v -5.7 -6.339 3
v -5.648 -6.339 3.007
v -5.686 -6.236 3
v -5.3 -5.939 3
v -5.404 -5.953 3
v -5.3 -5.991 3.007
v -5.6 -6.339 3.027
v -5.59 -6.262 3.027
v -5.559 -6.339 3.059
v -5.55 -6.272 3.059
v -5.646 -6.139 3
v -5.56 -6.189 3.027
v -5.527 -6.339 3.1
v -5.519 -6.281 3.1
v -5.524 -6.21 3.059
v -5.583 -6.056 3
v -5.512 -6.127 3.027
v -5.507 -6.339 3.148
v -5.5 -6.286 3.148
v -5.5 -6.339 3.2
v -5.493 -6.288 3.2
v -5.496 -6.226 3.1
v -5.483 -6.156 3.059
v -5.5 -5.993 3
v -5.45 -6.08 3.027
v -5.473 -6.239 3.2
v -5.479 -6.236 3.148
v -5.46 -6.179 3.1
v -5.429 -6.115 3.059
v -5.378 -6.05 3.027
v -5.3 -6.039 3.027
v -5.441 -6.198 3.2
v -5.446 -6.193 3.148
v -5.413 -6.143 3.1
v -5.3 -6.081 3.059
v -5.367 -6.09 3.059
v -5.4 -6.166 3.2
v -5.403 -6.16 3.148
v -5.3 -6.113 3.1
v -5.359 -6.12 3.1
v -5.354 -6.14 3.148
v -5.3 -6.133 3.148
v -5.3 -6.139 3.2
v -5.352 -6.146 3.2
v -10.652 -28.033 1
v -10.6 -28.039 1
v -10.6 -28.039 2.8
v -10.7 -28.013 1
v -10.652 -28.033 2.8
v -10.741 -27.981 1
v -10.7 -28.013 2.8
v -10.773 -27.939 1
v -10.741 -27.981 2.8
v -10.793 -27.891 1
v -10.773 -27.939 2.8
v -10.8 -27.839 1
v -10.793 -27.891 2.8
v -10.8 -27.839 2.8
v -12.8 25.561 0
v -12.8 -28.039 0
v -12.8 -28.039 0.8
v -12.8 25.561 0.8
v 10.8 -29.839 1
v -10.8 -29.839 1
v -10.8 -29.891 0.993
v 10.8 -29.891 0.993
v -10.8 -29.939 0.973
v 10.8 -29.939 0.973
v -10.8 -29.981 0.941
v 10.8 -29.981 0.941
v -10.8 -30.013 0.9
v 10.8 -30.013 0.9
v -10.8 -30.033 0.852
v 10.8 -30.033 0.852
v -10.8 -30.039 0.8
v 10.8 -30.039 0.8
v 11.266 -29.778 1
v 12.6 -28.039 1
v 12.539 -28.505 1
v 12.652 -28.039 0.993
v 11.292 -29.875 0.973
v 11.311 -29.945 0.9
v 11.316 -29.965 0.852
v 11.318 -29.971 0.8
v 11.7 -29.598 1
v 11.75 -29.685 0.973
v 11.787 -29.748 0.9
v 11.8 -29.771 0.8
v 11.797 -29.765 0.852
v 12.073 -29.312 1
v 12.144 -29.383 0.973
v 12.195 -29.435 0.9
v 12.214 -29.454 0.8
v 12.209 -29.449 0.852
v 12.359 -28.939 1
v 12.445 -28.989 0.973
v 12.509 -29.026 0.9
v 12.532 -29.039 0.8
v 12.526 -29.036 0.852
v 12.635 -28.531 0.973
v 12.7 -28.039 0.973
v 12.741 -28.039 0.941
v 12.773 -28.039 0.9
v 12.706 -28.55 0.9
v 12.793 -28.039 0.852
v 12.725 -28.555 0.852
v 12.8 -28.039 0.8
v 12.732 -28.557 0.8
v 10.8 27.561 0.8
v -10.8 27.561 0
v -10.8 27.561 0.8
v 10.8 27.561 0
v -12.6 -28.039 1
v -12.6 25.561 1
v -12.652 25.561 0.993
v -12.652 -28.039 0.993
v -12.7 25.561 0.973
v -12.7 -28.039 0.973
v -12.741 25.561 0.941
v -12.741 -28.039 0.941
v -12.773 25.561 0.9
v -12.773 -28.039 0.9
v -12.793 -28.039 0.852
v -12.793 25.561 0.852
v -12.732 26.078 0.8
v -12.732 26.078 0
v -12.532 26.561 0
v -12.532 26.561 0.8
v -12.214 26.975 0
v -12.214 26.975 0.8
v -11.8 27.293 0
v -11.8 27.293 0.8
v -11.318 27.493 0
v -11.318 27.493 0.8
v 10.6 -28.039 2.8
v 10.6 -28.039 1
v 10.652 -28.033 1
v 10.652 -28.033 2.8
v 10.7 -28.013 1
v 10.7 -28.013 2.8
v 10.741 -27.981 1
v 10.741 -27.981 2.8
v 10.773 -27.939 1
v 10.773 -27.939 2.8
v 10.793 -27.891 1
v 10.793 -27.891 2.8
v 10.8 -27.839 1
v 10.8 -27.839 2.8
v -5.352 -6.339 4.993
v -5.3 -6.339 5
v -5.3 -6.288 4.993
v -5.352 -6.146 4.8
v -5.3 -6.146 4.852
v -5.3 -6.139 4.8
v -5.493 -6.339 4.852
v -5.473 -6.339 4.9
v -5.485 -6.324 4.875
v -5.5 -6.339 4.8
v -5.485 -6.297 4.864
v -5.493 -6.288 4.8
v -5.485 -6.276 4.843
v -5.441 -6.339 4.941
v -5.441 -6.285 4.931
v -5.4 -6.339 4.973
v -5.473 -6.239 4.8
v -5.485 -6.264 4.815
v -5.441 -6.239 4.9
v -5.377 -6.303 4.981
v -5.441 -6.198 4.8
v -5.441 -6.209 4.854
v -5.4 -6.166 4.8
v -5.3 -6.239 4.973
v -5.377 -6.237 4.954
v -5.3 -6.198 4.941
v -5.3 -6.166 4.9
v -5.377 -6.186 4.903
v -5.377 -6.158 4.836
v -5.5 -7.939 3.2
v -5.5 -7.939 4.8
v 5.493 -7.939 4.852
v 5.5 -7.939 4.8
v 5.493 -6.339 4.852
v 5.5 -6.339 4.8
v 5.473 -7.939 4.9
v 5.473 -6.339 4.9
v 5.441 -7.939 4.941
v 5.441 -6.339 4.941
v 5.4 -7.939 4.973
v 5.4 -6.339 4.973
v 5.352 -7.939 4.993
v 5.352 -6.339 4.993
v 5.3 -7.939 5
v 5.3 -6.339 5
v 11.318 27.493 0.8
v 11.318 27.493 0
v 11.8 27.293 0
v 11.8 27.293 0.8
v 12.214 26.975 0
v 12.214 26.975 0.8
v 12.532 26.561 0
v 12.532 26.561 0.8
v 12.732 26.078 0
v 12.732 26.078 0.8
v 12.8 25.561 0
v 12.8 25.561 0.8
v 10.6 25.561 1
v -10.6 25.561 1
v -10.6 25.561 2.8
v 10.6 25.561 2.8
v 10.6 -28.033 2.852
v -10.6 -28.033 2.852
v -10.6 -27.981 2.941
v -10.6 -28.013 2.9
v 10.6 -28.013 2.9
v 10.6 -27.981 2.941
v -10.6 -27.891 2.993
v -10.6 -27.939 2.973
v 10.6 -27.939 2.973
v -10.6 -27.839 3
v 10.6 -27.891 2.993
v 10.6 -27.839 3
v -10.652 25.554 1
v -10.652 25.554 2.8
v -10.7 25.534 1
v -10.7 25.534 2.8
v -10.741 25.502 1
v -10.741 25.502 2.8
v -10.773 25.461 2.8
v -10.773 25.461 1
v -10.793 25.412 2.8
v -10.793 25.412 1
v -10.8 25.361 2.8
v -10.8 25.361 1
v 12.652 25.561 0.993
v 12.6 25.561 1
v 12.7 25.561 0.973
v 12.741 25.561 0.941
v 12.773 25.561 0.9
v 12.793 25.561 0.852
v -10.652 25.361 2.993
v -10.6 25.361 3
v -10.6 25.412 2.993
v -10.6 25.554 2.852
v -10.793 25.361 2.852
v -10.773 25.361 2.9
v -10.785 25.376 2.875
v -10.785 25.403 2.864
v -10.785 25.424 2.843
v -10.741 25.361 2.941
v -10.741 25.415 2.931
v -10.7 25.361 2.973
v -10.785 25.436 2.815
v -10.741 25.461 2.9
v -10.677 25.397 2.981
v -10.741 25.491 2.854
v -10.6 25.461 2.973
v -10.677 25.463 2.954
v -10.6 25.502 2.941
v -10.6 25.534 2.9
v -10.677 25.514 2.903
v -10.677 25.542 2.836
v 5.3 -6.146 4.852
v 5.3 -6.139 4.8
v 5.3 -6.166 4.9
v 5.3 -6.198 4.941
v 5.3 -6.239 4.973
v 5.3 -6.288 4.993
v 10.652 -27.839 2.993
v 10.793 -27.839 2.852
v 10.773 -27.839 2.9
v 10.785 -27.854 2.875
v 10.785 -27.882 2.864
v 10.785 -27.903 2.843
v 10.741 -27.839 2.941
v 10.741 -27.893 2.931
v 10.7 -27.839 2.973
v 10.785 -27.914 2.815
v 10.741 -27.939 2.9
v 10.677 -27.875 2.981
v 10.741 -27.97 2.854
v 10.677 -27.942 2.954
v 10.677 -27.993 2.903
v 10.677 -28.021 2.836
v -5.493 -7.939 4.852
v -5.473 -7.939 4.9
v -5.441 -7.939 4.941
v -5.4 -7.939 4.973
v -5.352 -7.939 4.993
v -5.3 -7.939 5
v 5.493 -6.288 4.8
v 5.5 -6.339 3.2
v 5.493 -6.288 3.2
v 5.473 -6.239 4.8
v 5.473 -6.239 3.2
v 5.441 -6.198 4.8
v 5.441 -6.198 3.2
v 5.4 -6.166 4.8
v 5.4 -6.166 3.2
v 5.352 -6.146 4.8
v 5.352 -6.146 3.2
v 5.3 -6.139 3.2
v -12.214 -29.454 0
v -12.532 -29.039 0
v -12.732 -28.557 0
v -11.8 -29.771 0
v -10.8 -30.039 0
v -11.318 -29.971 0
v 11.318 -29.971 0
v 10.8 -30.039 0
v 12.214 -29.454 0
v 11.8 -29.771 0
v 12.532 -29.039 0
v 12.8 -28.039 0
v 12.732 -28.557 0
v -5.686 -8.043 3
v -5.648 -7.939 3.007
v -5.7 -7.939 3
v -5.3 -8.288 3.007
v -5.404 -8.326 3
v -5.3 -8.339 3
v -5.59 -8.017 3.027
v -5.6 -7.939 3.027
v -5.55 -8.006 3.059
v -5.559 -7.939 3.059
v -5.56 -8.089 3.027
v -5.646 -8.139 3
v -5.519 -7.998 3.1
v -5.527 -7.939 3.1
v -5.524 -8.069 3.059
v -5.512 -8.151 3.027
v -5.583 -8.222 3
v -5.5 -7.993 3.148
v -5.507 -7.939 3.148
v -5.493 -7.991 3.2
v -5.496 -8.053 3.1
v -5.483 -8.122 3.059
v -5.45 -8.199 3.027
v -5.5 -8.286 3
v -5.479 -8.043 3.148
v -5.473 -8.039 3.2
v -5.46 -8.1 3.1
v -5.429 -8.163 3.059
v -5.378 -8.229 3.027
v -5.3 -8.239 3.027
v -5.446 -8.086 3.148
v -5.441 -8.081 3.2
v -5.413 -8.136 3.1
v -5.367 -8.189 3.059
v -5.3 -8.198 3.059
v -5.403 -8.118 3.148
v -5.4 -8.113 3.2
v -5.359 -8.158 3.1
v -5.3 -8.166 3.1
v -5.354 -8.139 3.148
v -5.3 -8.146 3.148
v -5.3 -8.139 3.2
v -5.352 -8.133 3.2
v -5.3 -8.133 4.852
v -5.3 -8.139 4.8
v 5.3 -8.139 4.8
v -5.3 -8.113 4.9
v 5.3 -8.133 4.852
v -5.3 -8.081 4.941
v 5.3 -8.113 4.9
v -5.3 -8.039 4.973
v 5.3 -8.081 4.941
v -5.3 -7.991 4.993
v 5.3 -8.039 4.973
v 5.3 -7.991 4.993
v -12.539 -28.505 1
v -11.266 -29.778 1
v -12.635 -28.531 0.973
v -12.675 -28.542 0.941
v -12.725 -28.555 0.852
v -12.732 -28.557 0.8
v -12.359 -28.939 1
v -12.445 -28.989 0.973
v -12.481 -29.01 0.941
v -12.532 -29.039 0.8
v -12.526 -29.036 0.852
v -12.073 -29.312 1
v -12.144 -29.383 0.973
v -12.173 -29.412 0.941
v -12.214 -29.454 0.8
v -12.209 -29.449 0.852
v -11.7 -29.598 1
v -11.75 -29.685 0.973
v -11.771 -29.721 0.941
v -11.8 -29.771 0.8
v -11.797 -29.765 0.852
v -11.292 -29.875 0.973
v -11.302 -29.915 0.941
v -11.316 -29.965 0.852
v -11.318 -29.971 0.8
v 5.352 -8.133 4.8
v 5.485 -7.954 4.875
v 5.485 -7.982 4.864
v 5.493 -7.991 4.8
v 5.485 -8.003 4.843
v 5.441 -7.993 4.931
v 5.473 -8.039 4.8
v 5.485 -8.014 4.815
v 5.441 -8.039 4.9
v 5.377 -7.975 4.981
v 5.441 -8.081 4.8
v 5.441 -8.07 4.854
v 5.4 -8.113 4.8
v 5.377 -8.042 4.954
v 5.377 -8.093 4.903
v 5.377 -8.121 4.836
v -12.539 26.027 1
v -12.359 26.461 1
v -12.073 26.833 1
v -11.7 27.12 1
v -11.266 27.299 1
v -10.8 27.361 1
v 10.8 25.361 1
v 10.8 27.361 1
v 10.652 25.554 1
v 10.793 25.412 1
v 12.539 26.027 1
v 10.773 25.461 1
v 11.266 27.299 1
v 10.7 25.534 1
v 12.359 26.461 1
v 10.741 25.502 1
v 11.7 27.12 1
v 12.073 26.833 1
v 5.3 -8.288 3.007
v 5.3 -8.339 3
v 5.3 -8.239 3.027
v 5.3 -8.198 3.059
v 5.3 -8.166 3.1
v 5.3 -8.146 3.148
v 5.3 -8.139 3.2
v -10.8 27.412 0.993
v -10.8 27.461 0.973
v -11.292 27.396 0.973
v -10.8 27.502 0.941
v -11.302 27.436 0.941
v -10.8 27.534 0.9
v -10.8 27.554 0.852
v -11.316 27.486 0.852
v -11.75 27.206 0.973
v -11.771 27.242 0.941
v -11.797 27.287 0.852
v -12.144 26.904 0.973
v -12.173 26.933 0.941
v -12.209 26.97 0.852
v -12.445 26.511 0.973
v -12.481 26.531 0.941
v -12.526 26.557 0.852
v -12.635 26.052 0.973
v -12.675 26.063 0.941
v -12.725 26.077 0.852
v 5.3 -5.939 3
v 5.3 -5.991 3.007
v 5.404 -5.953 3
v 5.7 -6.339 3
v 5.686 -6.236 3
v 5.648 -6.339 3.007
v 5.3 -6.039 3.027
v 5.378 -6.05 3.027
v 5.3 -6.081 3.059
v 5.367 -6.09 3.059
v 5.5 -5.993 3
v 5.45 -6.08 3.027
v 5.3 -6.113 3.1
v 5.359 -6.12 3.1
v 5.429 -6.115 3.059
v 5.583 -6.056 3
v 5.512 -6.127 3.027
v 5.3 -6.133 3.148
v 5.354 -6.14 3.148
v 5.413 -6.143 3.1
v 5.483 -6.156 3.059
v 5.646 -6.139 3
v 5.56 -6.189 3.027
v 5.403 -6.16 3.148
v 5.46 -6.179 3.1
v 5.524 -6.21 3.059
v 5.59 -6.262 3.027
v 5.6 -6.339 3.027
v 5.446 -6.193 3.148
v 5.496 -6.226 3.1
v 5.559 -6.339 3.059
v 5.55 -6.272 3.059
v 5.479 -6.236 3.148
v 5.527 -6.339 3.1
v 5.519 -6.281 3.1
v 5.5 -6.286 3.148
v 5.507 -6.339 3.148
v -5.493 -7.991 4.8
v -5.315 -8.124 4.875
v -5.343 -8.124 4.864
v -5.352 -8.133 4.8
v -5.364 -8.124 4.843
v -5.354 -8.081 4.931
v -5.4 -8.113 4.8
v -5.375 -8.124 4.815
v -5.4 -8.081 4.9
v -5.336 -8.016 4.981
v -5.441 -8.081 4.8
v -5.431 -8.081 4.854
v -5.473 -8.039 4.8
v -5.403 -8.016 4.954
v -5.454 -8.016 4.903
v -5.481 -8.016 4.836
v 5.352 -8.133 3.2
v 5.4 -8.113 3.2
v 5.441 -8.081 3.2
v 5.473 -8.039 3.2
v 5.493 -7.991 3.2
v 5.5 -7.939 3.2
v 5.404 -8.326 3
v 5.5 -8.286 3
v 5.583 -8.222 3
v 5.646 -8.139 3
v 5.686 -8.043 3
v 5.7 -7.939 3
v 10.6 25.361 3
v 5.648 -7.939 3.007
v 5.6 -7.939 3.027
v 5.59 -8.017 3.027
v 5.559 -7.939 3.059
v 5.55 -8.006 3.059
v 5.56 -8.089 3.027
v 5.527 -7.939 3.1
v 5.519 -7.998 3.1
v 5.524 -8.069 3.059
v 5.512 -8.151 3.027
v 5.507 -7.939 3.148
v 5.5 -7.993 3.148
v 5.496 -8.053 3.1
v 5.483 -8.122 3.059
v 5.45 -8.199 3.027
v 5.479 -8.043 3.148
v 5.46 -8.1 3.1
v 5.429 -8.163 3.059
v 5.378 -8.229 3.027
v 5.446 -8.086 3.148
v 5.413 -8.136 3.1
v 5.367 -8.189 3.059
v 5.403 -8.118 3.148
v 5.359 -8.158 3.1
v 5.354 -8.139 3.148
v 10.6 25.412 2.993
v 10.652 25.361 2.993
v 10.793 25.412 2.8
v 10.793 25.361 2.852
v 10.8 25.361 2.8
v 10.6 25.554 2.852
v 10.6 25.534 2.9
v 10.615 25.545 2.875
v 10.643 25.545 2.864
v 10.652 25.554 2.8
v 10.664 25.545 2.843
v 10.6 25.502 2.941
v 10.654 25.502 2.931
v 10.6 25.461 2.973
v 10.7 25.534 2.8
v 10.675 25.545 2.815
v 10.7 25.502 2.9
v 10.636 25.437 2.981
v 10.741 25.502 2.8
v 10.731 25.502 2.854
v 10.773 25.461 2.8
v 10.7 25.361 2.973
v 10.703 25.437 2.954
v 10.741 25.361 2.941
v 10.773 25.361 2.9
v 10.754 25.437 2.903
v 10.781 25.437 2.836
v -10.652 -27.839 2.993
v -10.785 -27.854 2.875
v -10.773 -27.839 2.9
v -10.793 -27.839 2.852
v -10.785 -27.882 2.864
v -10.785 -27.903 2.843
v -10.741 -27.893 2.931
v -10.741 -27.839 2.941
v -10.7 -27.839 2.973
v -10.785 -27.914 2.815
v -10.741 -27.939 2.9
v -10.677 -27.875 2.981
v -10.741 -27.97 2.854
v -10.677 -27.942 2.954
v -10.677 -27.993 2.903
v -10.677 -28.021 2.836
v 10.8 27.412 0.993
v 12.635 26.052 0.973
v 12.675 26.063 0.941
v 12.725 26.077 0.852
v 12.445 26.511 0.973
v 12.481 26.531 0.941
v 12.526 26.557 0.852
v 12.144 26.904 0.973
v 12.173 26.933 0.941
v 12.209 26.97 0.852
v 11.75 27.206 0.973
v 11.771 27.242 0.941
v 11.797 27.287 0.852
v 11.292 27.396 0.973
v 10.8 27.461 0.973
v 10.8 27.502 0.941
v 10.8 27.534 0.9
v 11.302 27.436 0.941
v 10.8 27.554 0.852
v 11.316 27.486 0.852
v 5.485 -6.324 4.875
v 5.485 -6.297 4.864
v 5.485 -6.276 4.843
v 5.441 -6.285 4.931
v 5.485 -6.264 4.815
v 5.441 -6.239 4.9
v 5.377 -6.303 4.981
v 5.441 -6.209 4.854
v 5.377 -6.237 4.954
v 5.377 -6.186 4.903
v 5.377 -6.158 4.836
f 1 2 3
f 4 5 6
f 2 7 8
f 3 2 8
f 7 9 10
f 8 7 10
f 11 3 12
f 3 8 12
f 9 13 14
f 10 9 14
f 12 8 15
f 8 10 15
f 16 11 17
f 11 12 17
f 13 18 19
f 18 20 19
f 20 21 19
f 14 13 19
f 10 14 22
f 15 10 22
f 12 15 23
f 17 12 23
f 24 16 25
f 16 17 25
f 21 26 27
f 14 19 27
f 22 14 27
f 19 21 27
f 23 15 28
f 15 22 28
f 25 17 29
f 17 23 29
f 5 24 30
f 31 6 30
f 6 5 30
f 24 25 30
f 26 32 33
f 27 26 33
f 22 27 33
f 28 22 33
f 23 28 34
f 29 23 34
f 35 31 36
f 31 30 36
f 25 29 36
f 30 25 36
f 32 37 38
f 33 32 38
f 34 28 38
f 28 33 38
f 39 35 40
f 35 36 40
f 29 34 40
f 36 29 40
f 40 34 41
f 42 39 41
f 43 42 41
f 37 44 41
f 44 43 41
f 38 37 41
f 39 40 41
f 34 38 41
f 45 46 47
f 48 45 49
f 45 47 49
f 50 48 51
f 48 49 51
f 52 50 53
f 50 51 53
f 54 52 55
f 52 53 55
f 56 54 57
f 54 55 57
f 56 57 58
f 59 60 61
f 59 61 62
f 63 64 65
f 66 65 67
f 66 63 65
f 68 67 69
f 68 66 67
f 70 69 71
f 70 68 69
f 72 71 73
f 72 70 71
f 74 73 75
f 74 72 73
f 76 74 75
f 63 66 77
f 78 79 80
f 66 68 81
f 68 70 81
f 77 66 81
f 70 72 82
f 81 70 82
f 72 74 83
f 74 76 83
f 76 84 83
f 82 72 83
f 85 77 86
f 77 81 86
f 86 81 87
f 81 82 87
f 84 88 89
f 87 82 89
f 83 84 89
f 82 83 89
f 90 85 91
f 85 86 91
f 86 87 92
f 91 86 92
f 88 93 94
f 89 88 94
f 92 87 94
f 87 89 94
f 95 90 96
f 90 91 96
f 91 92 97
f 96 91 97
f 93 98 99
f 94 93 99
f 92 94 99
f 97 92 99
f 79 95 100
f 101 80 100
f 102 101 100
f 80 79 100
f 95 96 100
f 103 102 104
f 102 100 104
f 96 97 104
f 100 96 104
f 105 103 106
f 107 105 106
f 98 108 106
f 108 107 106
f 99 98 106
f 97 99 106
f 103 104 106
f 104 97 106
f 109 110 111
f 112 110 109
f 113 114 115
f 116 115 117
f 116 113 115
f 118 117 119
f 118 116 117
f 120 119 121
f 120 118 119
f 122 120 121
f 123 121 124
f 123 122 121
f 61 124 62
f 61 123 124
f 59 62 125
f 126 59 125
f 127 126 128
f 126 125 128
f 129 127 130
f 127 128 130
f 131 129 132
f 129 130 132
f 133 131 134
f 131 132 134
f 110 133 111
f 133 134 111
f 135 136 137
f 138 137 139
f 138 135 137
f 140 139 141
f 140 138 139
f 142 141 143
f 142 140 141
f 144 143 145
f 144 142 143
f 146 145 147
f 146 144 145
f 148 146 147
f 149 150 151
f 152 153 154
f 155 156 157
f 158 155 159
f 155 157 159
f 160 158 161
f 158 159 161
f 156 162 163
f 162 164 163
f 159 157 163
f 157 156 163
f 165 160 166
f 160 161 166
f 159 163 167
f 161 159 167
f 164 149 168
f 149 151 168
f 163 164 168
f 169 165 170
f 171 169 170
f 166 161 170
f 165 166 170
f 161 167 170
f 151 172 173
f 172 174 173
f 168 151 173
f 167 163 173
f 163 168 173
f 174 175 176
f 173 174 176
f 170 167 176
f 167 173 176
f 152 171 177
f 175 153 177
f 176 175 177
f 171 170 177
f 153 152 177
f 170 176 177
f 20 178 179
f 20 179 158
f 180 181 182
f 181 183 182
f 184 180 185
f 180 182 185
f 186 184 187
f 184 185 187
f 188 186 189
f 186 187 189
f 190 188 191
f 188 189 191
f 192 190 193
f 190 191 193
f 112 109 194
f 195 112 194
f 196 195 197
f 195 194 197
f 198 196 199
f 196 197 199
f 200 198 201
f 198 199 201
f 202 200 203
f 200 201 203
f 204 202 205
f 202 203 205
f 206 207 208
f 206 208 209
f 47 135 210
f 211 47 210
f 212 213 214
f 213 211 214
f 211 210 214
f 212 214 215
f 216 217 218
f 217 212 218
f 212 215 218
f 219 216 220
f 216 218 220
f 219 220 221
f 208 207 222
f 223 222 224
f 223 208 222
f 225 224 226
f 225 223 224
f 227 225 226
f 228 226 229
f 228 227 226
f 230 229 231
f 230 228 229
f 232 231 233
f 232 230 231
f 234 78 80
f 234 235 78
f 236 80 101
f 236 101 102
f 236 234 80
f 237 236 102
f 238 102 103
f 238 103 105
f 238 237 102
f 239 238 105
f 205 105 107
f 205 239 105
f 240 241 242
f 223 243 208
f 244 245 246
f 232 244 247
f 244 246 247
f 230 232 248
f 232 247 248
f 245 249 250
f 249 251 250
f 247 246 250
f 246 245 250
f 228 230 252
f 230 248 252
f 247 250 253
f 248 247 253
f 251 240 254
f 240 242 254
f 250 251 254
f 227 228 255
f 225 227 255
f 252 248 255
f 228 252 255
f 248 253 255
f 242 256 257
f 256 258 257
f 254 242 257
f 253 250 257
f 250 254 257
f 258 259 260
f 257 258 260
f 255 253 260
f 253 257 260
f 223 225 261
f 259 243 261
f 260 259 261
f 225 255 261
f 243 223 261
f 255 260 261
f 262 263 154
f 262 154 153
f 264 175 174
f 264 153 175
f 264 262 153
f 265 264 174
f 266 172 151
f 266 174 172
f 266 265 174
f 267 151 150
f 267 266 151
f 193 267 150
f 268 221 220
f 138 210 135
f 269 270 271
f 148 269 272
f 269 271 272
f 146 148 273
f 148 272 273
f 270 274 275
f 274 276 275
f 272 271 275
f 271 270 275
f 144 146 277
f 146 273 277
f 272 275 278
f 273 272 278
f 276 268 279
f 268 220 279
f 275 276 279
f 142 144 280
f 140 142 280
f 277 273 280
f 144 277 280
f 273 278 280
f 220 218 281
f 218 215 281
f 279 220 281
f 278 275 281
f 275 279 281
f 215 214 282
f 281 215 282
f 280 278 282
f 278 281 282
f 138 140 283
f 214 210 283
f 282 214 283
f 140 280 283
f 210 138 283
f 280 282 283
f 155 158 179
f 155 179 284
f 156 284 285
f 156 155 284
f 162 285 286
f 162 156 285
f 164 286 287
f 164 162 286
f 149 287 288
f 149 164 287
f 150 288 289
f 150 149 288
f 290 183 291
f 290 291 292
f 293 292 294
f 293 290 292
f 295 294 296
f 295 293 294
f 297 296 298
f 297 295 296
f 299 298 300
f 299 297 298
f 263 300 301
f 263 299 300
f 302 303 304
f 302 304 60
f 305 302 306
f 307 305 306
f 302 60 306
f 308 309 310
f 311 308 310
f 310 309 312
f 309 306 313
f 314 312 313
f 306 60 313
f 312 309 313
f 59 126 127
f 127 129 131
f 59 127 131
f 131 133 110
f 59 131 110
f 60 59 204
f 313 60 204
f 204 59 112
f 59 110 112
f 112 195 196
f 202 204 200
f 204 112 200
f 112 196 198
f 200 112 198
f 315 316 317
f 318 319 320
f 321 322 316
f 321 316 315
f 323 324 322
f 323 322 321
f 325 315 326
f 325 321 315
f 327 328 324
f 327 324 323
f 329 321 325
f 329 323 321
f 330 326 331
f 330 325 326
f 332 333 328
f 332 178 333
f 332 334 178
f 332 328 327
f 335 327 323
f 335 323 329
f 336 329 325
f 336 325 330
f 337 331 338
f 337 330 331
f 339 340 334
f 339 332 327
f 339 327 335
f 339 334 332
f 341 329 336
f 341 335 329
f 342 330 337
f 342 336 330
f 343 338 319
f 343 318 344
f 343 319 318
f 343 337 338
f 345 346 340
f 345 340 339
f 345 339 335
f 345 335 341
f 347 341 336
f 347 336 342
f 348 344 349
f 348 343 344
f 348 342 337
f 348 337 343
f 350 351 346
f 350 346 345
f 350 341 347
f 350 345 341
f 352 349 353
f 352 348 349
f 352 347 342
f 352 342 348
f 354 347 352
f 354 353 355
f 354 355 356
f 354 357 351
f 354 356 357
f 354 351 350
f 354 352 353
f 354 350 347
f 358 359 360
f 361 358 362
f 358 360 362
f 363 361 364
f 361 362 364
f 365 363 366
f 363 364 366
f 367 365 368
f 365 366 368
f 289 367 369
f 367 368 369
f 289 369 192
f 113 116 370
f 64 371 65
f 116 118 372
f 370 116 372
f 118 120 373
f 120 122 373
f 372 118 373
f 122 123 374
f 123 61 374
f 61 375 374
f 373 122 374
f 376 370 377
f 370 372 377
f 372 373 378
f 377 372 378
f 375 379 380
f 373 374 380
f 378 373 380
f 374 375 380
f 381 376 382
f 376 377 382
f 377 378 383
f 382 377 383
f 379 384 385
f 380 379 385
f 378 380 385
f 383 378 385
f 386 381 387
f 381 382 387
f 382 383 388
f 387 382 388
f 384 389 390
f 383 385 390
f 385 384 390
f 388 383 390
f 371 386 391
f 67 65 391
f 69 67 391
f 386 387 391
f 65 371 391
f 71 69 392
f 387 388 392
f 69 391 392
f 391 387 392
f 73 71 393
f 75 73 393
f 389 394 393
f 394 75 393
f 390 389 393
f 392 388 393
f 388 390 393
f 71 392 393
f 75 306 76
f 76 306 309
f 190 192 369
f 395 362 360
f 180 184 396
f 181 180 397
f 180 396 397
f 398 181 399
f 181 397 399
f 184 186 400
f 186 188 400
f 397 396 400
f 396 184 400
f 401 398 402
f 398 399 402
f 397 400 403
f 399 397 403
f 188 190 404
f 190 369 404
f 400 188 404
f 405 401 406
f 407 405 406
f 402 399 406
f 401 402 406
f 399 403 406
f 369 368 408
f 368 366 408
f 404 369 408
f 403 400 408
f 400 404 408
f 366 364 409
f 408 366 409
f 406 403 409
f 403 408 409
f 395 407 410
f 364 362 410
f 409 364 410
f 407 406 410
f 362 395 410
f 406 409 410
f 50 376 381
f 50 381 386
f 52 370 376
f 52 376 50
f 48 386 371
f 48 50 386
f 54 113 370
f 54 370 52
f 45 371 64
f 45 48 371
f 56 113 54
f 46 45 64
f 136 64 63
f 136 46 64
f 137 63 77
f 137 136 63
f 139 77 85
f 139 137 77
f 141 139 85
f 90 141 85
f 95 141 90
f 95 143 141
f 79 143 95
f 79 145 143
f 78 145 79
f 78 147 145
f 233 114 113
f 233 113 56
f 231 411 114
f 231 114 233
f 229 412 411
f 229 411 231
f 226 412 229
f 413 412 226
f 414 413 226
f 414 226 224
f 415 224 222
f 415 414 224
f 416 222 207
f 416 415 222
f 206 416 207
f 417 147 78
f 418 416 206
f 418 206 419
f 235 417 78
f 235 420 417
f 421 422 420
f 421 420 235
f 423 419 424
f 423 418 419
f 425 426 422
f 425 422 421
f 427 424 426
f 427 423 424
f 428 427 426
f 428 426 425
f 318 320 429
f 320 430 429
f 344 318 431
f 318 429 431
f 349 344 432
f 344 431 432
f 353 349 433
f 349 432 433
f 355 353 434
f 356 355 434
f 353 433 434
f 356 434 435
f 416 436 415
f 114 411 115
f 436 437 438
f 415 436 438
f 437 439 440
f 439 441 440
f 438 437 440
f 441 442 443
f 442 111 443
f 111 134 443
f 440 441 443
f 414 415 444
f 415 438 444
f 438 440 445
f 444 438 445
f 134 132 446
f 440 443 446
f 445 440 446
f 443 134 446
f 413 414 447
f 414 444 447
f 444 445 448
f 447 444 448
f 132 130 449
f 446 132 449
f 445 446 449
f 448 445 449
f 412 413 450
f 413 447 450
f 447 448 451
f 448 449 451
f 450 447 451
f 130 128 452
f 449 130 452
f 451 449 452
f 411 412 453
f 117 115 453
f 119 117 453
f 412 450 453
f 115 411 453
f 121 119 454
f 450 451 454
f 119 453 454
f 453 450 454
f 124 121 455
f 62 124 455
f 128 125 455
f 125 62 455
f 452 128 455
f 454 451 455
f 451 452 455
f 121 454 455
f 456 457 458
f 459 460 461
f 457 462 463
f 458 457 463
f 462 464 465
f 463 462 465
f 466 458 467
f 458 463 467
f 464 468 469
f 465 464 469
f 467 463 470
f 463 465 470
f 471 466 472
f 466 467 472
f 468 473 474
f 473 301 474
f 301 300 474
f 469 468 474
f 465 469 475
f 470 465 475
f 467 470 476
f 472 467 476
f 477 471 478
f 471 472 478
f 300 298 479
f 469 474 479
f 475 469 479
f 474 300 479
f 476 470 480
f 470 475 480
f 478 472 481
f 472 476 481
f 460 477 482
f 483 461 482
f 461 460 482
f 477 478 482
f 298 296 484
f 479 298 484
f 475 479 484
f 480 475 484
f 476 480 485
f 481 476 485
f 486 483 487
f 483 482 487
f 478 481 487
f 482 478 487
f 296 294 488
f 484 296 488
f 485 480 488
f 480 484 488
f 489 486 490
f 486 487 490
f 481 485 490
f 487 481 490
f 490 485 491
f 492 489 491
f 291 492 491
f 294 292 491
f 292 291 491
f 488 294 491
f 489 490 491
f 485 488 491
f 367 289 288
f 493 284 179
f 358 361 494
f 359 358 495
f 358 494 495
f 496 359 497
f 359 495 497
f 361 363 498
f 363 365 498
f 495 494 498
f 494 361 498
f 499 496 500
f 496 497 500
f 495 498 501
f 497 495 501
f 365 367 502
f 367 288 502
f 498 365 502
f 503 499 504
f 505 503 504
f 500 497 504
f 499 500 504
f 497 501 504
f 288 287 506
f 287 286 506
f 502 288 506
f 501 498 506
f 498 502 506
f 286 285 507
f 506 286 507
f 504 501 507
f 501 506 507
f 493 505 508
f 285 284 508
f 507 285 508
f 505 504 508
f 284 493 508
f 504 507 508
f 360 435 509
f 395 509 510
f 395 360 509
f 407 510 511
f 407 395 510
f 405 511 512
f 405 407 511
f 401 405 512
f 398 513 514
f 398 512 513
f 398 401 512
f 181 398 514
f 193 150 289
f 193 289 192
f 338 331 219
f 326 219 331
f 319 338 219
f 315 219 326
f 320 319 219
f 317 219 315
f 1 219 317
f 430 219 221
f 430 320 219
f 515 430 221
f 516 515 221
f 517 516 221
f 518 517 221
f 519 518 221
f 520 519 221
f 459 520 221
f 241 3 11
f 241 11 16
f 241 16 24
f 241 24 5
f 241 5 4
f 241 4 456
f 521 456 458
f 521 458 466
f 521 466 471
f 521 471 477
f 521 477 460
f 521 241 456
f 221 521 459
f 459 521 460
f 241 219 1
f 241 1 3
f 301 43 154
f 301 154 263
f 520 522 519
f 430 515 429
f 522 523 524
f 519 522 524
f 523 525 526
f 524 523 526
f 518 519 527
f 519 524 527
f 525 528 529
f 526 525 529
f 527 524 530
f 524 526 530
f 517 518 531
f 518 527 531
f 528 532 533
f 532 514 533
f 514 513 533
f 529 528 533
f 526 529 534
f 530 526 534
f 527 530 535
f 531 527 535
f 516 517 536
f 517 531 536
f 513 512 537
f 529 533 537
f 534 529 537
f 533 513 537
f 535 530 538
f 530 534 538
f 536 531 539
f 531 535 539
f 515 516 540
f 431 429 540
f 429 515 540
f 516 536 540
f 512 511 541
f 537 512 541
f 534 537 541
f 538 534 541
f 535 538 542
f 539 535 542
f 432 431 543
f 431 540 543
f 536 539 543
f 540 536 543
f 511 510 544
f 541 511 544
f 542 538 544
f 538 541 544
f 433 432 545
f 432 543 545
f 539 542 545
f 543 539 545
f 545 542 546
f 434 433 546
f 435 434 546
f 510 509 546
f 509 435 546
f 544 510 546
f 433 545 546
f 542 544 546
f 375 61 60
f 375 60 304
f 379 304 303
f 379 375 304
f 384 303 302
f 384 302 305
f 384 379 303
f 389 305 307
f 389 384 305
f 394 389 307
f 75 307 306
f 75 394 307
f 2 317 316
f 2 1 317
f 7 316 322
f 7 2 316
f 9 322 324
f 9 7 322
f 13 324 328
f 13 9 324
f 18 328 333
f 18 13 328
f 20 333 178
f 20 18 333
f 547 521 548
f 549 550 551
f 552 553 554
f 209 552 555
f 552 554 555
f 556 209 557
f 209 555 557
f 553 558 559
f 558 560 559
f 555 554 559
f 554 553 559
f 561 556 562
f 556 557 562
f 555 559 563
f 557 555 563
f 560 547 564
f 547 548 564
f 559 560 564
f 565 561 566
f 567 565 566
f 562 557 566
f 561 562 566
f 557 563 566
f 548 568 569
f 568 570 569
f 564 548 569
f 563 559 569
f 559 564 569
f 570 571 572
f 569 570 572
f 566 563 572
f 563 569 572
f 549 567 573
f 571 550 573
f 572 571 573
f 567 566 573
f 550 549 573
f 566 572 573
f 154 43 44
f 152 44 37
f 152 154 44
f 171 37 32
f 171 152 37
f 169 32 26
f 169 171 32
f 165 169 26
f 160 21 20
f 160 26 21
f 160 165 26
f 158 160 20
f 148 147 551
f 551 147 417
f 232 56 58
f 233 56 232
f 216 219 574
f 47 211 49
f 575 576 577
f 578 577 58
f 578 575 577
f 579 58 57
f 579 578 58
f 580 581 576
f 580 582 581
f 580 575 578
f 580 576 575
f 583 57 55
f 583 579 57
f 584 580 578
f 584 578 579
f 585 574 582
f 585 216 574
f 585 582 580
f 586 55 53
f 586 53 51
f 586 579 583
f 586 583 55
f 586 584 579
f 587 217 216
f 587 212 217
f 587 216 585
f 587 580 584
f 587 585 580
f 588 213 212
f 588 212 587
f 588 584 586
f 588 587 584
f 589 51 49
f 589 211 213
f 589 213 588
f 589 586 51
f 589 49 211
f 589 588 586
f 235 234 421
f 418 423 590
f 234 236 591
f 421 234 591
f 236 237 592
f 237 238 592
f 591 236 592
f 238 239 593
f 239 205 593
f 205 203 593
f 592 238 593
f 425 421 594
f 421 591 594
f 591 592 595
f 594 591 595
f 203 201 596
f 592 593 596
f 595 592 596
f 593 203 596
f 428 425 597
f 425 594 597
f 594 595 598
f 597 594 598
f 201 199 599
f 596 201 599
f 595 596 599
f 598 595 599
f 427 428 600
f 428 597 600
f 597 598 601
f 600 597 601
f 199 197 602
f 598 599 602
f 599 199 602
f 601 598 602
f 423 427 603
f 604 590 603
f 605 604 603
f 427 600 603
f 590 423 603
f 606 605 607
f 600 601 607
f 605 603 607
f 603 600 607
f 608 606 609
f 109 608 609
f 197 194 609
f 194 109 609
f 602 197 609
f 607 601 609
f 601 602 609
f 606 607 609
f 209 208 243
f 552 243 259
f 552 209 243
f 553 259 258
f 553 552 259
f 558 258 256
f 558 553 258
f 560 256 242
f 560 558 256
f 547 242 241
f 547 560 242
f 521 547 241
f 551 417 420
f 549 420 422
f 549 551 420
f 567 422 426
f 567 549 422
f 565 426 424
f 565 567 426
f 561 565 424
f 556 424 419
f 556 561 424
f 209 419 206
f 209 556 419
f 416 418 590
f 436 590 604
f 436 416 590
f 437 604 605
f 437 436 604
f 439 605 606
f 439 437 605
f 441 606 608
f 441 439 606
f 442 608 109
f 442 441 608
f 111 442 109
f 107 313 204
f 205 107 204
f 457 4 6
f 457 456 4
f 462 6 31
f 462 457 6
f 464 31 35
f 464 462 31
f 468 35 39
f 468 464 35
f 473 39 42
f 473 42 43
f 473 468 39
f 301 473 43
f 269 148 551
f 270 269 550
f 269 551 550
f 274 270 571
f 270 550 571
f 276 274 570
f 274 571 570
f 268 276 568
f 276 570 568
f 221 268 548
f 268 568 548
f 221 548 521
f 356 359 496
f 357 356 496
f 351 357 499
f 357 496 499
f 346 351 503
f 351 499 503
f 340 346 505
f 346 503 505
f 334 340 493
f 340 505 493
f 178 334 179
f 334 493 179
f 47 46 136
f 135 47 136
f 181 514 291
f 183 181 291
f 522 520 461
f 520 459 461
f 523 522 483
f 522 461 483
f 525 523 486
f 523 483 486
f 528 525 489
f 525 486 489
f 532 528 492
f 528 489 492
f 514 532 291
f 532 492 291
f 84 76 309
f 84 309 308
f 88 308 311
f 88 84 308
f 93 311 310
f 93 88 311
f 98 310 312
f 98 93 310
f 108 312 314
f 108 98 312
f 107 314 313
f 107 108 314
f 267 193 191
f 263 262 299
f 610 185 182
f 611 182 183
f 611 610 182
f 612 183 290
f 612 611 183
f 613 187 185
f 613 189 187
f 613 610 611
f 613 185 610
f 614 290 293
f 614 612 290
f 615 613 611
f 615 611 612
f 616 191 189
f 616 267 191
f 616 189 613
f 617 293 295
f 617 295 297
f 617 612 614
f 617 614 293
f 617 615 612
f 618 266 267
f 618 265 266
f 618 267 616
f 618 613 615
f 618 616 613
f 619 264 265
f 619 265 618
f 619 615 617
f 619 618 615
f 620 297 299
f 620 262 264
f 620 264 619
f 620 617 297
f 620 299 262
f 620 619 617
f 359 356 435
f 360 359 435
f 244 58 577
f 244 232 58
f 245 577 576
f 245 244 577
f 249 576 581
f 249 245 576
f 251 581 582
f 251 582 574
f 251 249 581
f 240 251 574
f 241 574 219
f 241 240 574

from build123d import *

# Parameters (mm, degrees)
F0_W     = 25.6
F0_H     = 57.6
F0_W_2   = 21.6
F0_H_2   = 53.6
F1_DEPTH = 1
F0_W_3   = 11
F0_H_3   = 2
F2_DEPTH = 3
F3_DEPTH = 5
F4_R     = 2
F5_R     = 0.2


with BuildPart() as f1:
    # F0 (on Top) → F1 (new body)
    with BuildSketch(Plane.XY):
        with Locations((0, -1.2393394568)):
            Rectangle(F0_W, F0_H)
        with Locations((0, -1.2393394568)):
            Rectangle(F0_W_2, F0_H_2, mode=Mode.SUBTRACT)
    extrude(amount=F1_DEPTH)

    # F0 (on Top) → F2 (join)
    with BuildSketch(Plane.XY):
        with Locations((0, -1.2393394568)):
            Rectangle(F0_W_2, F0_H_2)
        with Locations((0, -7.1393394568)):
            Rectangle(F0_W_3, F0_H_3, mode=Mode.SUBTRACT)
    extrude(amount=F2_DEPTH)

    # F0 (on Top) → F3 (join)
    with BuildSketch(Plane.XY):
        with Locations((0, -7.1393394568)):
            Rectangle(F0_W_3, F0_H_3)
    extrude(amount=F3_DEPTH)

    # F4
    f4_edges = [f1.edges().sort_by_distance(p)[0] for p in [
        (-12.8, -30.039339, 0.5),
        (12.8, -30.039339, 0.5),
        (12.8, 27.560661, 0.5),
        (-12.8, 27.560661, 0.5),
    ]]
    fillet(f4_edges, radius=F4_R)

    # F5
    f5_edges = [f1.edges().sort_by_distance(p)[0] for p in [
        (12.8, -1.239339, 1),
        (0, -28.039339, 3),
        (10.8, -1.239339, 3),
        (0, 25.560661, 3),
        (-10.8, -1.239339, 3),
        (-5.5, -7.139339, 3),
        (0, -6.139339, 3),
        (5.5, -7.139339, 3),
        (0, -8.139339, 3),
        (10.8, 25.560661, 2),
        (-10.8, 25.560661, 2),
        (-10.8, -28.039339, 2),
        (10.8, -28.039339, 2),
        (0, -6.139339, 5),
        (-5.5, -7.139339, 5),
        (0, -8.139339, 5),
        (5.5, -7.139339, 5),
        (5.5, -8.139339, 4),
        (-5.5, -8.139339, 4),
        (5.5, -6.139339, 4),
        (-5.5, -6.139339, 4),
    ]]
    fillet(f5_edges, radius=F5_R)


solid = f1.part
